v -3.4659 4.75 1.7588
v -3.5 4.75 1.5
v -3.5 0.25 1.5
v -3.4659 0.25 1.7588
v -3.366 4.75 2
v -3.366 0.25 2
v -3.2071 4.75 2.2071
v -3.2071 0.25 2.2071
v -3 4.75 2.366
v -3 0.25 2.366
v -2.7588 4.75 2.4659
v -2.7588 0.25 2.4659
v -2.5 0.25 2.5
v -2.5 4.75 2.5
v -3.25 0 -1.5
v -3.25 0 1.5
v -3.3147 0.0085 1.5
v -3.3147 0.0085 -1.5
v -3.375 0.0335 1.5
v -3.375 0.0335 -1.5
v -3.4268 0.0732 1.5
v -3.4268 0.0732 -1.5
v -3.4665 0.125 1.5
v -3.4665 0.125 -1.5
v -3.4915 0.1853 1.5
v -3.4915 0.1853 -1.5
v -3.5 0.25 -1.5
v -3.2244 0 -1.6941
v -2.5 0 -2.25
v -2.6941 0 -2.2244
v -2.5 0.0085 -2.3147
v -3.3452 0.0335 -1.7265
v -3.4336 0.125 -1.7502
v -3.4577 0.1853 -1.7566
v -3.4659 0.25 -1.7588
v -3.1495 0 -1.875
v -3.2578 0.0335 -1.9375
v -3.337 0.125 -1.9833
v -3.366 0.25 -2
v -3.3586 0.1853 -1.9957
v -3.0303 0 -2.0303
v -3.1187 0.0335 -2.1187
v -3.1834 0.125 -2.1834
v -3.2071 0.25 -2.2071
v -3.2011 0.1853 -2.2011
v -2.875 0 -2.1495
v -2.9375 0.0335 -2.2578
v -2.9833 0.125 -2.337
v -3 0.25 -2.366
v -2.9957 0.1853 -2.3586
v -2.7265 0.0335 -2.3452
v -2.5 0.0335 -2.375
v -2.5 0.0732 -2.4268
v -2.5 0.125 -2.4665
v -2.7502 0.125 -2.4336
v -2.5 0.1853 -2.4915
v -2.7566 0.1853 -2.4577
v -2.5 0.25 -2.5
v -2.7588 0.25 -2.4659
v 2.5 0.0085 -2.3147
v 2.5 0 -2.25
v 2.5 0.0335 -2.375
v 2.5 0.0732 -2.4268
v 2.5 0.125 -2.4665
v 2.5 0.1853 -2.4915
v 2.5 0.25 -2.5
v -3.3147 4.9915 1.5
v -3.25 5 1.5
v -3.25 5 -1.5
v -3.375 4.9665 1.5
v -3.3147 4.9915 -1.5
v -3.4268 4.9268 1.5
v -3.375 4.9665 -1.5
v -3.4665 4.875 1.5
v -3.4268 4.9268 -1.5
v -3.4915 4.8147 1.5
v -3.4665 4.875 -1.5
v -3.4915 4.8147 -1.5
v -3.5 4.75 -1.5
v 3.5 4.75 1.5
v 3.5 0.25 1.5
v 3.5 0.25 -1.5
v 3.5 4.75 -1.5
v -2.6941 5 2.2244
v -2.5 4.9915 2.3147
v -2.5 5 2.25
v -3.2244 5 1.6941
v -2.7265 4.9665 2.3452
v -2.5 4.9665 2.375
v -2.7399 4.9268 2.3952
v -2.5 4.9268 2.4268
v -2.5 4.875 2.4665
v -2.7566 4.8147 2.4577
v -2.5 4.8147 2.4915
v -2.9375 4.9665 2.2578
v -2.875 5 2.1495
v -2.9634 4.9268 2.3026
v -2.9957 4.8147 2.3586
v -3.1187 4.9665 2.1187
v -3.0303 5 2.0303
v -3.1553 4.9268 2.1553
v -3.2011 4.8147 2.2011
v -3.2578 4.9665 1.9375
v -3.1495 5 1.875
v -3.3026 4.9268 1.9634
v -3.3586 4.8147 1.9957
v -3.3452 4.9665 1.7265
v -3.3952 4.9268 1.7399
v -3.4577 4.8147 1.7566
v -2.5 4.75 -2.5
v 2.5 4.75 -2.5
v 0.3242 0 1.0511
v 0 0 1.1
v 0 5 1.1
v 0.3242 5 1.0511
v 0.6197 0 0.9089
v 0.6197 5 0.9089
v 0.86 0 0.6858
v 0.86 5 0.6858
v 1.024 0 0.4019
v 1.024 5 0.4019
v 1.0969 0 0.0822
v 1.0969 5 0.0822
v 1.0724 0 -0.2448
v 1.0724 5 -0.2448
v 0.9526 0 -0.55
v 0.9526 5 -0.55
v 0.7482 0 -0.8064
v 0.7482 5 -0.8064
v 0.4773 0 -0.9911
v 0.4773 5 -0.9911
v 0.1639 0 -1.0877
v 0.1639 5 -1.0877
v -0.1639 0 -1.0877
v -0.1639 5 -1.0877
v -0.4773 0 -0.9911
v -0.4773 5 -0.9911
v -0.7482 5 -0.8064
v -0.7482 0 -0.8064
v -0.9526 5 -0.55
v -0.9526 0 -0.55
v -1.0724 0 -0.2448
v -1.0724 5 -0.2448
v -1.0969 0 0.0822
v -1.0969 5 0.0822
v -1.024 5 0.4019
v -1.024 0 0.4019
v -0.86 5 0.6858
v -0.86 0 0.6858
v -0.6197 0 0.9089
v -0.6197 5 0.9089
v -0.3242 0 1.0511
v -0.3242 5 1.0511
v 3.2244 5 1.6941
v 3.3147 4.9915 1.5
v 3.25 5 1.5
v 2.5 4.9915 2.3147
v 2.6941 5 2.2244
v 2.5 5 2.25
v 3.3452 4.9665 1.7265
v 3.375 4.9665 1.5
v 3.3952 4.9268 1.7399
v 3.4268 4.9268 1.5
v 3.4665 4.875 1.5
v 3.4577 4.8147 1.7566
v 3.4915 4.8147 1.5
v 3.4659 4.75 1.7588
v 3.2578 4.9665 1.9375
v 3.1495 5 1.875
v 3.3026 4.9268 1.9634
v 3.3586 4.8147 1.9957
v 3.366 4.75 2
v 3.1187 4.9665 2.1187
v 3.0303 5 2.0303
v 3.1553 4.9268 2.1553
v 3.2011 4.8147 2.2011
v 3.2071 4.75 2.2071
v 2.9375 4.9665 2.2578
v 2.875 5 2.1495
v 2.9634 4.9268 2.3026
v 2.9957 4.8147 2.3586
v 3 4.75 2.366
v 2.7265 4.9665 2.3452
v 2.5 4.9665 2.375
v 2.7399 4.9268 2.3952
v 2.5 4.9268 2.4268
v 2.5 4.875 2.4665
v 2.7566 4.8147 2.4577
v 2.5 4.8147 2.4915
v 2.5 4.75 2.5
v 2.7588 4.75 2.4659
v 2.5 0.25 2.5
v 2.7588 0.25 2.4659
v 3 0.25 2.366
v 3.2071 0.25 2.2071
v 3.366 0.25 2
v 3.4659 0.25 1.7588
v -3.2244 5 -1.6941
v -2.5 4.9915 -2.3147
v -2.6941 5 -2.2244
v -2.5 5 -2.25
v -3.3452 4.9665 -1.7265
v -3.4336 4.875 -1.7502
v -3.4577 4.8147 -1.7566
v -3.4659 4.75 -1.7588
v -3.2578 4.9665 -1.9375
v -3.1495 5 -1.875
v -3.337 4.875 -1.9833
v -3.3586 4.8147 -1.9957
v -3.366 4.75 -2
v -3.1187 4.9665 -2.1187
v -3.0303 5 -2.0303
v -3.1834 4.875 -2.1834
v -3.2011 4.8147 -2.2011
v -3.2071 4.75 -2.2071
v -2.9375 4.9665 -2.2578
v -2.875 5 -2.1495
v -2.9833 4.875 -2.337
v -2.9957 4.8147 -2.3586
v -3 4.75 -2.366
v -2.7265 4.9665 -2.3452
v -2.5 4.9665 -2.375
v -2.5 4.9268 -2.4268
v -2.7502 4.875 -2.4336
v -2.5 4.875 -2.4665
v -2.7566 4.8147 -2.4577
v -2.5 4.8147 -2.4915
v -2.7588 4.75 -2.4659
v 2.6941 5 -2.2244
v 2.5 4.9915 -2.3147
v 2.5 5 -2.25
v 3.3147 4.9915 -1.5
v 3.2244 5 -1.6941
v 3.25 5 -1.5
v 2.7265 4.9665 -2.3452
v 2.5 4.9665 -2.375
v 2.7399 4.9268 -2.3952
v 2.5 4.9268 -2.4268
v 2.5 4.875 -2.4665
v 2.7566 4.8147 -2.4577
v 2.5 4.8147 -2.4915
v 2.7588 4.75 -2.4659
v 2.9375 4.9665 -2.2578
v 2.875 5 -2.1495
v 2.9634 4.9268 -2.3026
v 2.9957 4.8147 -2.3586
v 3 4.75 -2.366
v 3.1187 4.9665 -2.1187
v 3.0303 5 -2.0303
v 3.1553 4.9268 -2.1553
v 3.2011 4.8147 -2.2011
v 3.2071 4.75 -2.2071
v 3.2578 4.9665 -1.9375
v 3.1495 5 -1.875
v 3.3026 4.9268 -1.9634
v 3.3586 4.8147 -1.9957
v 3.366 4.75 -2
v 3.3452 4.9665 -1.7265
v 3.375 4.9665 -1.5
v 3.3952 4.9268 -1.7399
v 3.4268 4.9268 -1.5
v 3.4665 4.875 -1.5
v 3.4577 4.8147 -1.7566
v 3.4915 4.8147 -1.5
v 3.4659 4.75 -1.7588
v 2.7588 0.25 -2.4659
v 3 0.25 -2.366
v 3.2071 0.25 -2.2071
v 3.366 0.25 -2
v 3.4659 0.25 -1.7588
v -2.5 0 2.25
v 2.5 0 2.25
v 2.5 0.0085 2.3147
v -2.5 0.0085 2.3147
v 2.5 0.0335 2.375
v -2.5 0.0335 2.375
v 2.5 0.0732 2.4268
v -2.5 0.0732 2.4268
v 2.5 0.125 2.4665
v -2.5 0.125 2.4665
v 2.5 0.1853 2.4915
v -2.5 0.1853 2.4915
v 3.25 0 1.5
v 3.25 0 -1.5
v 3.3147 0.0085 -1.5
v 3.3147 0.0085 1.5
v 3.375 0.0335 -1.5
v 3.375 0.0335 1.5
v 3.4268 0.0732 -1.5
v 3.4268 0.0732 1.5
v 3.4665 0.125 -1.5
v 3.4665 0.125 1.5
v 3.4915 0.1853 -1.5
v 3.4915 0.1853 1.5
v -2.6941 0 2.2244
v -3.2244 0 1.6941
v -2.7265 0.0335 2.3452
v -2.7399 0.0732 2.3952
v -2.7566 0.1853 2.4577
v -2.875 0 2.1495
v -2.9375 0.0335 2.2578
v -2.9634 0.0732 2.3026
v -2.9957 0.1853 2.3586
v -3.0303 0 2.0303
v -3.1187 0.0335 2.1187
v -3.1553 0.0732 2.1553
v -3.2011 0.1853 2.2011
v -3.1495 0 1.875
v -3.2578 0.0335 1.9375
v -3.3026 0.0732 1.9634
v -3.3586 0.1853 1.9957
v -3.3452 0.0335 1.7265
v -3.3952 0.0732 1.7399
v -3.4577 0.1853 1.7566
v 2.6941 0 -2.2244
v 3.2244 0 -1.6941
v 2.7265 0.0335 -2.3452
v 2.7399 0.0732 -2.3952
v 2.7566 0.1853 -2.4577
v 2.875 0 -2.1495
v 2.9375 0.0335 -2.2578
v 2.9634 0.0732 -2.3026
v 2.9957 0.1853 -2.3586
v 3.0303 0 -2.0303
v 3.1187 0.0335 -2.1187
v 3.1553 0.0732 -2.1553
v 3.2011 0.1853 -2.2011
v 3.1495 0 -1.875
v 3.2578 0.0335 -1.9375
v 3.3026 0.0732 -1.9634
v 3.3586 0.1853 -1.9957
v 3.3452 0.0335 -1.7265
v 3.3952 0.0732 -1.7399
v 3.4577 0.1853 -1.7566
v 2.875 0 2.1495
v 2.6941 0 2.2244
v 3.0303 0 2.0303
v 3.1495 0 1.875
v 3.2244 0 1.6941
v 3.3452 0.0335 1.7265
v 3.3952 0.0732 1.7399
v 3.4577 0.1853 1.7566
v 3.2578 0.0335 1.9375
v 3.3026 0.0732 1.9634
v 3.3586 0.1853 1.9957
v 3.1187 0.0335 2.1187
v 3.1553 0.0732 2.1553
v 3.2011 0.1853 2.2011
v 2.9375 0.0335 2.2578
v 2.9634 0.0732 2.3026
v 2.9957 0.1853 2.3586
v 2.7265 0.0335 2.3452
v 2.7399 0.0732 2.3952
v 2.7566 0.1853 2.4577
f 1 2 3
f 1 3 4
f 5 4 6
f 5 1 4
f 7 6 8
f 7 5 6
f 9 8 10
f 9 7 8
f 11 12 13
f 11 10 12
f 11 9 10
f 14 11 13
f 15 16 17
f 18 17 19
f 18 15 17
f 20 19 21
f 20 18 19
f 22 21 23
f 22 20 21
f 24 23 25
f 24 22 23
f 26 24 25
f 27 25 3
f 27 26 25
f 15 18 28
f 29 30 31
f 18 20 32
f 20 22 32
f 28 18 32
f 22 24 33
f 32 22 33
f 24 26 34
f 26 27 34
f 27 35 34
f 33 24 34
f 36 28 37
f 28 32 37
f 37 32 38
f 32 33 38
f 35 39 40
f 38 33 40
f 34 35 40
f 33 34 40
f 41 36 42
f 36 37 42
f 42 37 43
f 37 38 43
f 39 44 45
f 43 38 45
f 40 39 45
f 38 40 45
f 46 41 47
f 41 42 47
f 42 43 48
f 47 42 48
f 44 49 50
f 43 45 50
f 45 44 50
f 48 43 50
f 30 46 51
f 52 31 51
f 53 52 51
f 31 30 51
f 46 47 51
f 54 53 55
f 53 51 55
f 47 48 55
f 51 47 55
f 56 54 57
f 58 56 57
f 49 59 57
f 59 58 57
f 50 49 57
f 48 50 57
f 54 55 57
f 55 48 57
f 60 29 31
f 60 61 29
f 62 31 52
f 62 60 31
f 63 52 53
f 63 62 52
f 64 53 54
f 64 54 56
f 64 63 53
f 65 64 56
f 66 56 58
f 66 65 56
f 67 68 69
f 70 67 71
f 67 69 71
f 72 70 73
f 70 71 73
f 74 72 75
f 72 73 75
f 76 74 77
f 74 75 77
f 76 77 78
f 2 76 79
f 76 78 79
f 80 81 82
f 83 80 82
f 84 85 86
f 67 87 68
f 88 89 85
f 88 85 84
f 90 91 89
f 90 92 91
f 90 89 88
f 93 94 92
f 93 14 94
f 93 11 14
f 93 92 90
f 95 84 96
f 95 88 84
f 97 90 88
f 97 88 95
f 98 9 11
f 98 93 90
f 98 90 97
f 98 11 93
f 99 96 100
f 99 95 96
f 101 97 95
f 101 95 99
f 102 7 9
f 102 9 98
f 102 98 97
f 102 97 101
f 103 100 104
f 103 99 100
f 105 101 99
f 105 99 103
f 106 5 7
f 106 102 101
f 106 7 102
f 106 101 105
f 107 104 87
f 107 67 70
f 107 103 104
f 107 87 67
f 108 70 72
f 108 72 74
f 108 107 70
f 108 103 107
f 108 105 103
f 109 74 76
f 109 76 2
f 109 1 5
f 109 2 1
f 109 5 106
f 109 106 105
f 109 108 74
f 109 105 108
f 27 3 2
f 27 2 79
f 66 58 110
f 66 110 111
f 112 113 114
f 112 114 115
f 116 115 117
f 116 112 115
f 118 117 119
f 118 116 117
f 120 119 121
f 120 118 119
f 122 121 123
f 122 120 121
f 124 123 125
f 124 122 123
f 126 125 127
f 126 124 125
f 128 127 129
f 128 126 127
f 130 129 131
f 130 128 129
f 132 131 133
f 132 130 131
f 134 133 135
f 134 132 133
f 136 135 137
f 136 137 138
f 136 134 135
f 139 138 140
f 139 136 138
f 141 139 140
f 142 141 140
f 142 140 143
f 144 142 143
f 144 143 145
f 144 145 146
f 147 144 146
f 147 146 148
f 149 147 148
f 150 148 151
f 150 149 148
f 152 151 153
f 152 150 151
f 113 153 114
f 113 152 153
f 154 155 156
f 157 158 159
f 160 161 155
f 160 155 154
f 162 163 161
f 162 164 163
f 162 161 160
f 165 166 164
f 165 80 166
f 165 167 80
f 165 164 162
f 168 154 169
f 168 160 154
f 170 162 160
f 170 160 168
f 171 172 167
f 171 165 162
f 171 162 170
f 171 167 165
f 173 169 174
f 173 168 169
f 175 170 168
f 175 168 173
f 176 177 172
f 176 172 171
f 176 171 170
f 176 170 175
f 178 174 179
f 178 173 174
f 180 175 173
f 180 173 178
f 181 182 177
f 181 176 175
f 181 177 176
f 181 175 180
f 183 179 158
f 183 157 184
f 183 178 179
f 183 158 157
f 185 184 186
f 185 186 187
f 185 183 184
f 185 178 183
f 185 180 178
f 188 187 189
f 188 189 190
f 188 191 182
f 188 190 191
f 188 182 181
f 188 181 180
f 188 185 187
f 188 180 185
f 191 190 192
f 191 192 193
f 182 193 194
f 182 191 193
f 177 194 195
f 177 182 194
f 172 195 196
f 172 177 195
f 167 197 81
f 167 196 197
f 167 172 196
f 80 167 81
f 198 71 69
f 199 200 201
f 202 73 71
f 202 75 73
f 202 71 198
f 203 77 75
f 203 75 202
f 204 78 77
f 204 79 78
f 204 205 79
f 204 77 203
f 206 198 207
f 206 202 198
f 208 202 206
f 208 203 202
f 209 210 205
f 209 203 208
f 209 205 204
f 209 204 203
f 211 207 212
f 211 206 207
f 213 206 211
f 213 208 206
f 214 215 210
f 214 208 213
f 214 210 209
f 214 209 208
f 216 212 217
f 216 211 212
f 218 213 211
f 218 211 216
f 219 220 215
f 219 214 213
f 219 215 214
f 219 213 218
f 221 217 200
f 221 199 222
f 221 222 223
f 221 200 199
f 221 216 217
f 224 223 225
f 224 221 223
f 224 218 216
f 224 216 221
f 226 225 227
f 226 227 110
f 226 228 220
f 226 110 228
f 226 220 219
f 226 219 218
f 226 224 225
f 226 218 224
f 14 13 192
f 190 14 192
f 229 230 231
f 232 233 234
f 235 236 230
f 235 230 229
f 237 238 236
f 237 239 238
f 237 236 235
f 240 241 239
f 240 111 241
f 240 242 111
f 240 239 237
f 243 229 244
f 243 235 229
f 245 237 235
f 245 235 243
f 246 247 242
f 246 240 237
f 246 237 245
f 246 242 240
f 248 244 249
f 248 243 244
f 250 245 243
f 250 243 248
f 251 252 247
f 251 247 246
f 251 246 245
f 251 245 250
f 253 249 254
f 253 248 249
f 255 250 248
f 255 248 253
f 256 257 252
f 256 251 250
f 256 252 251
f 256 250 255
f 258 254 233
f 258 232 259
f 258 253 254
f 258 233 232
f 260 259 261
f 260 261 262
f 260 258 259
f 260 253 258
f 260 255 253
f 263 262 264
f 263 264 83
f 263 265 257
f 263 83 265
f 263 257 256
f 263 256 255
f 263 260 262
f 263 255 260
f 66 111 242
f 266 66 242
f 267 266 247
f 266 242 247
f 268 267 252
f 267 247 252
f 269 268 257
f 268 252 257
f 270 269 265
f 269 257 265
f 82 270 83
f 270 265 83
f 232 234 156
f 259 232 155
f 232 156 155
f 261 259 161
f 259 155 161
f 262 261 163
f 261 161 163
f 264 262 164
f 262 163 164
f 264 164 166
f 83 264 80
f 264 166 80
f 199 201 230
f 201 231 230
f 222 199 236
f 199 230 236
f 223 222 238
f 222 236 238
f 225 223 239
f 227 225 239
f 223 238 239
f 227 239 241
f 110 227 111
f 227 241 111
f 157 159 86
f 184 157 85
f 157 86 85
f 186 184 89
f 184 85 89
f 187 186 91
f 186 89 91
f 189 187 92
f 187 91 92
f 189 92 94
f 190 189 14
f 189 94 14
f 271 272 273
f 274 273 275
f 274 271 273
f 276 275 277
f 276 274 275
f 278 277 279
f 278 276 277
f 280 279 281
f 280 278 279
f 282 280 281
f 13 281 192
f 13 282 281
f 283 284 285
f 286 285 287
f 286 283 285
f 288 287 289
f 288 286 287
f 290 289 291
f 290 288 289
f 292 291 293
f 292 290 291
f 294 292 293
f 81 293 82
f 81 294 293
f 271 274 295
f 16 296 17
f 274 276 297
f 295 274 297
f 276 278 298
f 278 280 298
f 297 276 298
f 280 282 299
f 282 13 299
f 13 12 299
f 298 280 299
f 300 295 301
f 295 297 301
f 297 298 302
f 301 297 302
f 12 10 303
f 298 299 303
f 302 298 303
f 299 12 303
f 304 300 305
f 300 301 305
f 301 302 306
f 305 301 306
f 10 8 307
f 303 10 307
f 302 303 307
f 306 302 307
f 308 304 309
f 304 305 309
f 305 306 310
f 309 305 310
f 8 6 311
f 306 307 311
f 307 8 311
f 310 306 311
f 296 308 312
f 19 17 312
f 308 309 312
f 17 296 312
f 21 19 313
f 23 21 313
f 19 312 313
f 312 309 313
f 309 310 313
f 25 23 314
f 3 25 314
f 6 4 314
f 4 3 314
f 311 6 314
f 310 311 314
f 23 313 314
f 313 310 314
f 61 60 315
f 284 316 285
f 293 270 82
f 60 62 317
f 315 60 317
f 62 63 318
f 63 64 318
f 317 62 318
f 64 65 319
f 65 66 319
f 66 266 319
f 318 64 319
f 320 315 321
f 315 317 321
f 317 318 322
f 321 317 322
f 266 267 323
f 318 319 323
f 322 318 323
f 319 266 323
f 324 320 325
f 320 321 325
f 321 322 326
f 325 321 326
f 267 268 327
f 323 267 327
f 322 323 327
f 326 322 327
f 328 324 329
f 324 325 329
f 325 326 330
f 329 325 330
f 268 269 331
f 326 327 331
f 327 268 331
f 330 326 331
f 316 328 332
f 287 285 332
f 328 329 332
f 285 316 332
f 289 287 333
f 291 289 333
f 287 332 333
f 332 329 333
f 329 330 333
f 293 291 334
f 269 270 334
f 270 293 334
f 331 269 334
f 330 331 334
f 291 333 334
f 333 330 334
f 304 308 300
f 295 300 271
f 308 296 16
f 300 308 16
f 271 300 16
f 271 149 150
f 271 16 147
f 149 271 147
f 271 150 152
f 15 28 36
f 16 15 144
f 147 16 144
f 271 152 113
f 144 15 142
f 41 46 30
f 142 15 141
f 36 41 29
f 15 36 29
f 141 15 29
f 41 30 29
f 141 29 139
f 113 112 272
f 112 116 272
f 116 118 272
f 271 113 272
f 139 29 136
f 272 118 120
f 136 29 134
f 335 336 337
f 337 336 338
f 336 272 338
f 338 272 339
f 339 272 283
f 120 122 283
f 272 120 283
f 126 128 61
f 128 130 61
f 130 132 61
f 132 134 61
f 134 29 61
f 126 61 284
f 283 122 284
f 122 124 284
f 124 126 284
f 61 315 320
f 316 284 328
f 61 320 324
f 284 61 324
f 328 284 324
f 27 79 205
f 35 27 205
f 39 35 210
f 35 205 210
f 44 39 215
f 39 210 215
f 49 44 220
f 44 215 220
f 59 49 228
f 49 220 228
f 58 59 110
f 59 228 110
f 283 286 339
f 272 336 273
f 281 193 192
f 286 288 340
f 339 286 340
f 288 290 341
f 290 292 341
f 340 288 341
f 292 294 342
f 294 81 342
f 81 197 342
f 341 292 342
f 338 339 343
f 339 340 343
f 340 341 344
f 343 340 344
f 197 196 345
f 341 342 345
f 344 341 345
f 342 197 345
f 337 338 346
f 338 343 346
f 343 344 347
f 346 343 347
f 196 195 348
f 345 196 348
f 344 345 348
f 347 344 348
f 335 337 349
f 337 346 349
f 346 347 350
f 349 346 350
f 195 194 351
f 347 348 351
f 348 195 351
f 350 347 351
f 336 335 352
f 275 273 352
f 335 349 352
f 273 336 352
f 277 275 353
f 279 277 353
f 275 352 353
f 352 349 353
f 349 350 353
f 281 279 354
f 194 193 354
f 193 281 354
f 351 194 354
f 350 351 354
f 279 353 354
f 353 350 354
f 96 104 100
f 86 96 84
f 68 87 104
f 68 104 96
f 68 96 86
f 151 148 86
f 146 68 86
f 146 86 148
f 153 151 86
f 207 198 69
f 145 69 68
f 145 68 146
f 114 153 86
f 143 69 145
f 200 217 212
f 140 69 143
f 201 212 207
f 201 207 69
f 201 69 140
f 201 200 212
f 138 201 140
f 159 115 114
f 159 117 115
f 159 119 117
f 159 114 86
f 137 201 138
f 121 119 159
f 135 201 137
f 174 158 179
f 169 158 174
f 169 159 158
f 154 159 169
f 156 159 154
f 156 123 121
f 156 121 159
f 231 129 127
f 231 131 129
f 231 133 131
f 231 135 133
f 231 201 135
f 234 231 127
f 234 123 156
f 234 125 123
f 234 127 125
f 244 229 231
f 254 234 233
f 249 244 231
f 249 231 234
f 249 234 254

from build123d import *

# Parameters (mm, degrees)
SKETCH_1_W      = 7
SKETCH_1_H      = 5
SKETCH_1_R      = 1.1
EXTRUDE_1_DEPTH = 5
FILLET_2_R      = 1
FILLET_1_R      = 0.25


with BuildPart() as part:
    # 草图1 → 凸台-拉伸1 (new body)
    with BuildSketch(Plane(origin=(0, 0, 0), x_dir=(1, 0, 0), z_dir=(0, 1, 0))):
        Rectangle(SKETCH_1_W, SKETCH_1_H)
        with Locations(Location((0, 0, 0), (0, 0, 270))):
            Circle(SKETCH_1_R, mode=Mode.SUBTRACT)
    extrude(amount=EXTRUDE_1_DEPTH)

    # 圆角2
    fillet_2_edges = [part.edges().sort_by_distance(p)[0] for p in [
        (3.5, 2.5, 2.5),
        (-3.5, 2.5, 2.5),
        (-3.5, 2.5, -2.5),
        (3.5, 2.5, -2.5),
    ]]
    fillet(fillet_2_edges, radius=FILLET_2_R)

    # 圆角1
    fillet_1_edges = [part.edges().sort_by_distance(p)[0] for p in [
        (0, 0, -2.5),
        (0, 5, -2.5),
        (3.5, 0, 0),
        (0, 0, 2.5),
        (-3.5, 0, 0),
        (-3.207106781, 0, -2.207106781),
        (-3.207106781, 0, 2.207106781),
        (3.207106781, 0, 2.207106781),
        (3.207106781, 0, -2.207106781),
        (3.5, 5, 0),
        (-3.5, 5, 0),
        (0, 5, 2.5),
        (-3.207106781, 5, -2.207106781),
        (-3.207106781, 5, 2.207106781),
        (3.207106781, 5, 2.207106781),
        (3.207106781, 5, -2.207106781),
    ]]
    fillet(fillet_1_edges, radius=FILLET_1_R)


solid = part.part
